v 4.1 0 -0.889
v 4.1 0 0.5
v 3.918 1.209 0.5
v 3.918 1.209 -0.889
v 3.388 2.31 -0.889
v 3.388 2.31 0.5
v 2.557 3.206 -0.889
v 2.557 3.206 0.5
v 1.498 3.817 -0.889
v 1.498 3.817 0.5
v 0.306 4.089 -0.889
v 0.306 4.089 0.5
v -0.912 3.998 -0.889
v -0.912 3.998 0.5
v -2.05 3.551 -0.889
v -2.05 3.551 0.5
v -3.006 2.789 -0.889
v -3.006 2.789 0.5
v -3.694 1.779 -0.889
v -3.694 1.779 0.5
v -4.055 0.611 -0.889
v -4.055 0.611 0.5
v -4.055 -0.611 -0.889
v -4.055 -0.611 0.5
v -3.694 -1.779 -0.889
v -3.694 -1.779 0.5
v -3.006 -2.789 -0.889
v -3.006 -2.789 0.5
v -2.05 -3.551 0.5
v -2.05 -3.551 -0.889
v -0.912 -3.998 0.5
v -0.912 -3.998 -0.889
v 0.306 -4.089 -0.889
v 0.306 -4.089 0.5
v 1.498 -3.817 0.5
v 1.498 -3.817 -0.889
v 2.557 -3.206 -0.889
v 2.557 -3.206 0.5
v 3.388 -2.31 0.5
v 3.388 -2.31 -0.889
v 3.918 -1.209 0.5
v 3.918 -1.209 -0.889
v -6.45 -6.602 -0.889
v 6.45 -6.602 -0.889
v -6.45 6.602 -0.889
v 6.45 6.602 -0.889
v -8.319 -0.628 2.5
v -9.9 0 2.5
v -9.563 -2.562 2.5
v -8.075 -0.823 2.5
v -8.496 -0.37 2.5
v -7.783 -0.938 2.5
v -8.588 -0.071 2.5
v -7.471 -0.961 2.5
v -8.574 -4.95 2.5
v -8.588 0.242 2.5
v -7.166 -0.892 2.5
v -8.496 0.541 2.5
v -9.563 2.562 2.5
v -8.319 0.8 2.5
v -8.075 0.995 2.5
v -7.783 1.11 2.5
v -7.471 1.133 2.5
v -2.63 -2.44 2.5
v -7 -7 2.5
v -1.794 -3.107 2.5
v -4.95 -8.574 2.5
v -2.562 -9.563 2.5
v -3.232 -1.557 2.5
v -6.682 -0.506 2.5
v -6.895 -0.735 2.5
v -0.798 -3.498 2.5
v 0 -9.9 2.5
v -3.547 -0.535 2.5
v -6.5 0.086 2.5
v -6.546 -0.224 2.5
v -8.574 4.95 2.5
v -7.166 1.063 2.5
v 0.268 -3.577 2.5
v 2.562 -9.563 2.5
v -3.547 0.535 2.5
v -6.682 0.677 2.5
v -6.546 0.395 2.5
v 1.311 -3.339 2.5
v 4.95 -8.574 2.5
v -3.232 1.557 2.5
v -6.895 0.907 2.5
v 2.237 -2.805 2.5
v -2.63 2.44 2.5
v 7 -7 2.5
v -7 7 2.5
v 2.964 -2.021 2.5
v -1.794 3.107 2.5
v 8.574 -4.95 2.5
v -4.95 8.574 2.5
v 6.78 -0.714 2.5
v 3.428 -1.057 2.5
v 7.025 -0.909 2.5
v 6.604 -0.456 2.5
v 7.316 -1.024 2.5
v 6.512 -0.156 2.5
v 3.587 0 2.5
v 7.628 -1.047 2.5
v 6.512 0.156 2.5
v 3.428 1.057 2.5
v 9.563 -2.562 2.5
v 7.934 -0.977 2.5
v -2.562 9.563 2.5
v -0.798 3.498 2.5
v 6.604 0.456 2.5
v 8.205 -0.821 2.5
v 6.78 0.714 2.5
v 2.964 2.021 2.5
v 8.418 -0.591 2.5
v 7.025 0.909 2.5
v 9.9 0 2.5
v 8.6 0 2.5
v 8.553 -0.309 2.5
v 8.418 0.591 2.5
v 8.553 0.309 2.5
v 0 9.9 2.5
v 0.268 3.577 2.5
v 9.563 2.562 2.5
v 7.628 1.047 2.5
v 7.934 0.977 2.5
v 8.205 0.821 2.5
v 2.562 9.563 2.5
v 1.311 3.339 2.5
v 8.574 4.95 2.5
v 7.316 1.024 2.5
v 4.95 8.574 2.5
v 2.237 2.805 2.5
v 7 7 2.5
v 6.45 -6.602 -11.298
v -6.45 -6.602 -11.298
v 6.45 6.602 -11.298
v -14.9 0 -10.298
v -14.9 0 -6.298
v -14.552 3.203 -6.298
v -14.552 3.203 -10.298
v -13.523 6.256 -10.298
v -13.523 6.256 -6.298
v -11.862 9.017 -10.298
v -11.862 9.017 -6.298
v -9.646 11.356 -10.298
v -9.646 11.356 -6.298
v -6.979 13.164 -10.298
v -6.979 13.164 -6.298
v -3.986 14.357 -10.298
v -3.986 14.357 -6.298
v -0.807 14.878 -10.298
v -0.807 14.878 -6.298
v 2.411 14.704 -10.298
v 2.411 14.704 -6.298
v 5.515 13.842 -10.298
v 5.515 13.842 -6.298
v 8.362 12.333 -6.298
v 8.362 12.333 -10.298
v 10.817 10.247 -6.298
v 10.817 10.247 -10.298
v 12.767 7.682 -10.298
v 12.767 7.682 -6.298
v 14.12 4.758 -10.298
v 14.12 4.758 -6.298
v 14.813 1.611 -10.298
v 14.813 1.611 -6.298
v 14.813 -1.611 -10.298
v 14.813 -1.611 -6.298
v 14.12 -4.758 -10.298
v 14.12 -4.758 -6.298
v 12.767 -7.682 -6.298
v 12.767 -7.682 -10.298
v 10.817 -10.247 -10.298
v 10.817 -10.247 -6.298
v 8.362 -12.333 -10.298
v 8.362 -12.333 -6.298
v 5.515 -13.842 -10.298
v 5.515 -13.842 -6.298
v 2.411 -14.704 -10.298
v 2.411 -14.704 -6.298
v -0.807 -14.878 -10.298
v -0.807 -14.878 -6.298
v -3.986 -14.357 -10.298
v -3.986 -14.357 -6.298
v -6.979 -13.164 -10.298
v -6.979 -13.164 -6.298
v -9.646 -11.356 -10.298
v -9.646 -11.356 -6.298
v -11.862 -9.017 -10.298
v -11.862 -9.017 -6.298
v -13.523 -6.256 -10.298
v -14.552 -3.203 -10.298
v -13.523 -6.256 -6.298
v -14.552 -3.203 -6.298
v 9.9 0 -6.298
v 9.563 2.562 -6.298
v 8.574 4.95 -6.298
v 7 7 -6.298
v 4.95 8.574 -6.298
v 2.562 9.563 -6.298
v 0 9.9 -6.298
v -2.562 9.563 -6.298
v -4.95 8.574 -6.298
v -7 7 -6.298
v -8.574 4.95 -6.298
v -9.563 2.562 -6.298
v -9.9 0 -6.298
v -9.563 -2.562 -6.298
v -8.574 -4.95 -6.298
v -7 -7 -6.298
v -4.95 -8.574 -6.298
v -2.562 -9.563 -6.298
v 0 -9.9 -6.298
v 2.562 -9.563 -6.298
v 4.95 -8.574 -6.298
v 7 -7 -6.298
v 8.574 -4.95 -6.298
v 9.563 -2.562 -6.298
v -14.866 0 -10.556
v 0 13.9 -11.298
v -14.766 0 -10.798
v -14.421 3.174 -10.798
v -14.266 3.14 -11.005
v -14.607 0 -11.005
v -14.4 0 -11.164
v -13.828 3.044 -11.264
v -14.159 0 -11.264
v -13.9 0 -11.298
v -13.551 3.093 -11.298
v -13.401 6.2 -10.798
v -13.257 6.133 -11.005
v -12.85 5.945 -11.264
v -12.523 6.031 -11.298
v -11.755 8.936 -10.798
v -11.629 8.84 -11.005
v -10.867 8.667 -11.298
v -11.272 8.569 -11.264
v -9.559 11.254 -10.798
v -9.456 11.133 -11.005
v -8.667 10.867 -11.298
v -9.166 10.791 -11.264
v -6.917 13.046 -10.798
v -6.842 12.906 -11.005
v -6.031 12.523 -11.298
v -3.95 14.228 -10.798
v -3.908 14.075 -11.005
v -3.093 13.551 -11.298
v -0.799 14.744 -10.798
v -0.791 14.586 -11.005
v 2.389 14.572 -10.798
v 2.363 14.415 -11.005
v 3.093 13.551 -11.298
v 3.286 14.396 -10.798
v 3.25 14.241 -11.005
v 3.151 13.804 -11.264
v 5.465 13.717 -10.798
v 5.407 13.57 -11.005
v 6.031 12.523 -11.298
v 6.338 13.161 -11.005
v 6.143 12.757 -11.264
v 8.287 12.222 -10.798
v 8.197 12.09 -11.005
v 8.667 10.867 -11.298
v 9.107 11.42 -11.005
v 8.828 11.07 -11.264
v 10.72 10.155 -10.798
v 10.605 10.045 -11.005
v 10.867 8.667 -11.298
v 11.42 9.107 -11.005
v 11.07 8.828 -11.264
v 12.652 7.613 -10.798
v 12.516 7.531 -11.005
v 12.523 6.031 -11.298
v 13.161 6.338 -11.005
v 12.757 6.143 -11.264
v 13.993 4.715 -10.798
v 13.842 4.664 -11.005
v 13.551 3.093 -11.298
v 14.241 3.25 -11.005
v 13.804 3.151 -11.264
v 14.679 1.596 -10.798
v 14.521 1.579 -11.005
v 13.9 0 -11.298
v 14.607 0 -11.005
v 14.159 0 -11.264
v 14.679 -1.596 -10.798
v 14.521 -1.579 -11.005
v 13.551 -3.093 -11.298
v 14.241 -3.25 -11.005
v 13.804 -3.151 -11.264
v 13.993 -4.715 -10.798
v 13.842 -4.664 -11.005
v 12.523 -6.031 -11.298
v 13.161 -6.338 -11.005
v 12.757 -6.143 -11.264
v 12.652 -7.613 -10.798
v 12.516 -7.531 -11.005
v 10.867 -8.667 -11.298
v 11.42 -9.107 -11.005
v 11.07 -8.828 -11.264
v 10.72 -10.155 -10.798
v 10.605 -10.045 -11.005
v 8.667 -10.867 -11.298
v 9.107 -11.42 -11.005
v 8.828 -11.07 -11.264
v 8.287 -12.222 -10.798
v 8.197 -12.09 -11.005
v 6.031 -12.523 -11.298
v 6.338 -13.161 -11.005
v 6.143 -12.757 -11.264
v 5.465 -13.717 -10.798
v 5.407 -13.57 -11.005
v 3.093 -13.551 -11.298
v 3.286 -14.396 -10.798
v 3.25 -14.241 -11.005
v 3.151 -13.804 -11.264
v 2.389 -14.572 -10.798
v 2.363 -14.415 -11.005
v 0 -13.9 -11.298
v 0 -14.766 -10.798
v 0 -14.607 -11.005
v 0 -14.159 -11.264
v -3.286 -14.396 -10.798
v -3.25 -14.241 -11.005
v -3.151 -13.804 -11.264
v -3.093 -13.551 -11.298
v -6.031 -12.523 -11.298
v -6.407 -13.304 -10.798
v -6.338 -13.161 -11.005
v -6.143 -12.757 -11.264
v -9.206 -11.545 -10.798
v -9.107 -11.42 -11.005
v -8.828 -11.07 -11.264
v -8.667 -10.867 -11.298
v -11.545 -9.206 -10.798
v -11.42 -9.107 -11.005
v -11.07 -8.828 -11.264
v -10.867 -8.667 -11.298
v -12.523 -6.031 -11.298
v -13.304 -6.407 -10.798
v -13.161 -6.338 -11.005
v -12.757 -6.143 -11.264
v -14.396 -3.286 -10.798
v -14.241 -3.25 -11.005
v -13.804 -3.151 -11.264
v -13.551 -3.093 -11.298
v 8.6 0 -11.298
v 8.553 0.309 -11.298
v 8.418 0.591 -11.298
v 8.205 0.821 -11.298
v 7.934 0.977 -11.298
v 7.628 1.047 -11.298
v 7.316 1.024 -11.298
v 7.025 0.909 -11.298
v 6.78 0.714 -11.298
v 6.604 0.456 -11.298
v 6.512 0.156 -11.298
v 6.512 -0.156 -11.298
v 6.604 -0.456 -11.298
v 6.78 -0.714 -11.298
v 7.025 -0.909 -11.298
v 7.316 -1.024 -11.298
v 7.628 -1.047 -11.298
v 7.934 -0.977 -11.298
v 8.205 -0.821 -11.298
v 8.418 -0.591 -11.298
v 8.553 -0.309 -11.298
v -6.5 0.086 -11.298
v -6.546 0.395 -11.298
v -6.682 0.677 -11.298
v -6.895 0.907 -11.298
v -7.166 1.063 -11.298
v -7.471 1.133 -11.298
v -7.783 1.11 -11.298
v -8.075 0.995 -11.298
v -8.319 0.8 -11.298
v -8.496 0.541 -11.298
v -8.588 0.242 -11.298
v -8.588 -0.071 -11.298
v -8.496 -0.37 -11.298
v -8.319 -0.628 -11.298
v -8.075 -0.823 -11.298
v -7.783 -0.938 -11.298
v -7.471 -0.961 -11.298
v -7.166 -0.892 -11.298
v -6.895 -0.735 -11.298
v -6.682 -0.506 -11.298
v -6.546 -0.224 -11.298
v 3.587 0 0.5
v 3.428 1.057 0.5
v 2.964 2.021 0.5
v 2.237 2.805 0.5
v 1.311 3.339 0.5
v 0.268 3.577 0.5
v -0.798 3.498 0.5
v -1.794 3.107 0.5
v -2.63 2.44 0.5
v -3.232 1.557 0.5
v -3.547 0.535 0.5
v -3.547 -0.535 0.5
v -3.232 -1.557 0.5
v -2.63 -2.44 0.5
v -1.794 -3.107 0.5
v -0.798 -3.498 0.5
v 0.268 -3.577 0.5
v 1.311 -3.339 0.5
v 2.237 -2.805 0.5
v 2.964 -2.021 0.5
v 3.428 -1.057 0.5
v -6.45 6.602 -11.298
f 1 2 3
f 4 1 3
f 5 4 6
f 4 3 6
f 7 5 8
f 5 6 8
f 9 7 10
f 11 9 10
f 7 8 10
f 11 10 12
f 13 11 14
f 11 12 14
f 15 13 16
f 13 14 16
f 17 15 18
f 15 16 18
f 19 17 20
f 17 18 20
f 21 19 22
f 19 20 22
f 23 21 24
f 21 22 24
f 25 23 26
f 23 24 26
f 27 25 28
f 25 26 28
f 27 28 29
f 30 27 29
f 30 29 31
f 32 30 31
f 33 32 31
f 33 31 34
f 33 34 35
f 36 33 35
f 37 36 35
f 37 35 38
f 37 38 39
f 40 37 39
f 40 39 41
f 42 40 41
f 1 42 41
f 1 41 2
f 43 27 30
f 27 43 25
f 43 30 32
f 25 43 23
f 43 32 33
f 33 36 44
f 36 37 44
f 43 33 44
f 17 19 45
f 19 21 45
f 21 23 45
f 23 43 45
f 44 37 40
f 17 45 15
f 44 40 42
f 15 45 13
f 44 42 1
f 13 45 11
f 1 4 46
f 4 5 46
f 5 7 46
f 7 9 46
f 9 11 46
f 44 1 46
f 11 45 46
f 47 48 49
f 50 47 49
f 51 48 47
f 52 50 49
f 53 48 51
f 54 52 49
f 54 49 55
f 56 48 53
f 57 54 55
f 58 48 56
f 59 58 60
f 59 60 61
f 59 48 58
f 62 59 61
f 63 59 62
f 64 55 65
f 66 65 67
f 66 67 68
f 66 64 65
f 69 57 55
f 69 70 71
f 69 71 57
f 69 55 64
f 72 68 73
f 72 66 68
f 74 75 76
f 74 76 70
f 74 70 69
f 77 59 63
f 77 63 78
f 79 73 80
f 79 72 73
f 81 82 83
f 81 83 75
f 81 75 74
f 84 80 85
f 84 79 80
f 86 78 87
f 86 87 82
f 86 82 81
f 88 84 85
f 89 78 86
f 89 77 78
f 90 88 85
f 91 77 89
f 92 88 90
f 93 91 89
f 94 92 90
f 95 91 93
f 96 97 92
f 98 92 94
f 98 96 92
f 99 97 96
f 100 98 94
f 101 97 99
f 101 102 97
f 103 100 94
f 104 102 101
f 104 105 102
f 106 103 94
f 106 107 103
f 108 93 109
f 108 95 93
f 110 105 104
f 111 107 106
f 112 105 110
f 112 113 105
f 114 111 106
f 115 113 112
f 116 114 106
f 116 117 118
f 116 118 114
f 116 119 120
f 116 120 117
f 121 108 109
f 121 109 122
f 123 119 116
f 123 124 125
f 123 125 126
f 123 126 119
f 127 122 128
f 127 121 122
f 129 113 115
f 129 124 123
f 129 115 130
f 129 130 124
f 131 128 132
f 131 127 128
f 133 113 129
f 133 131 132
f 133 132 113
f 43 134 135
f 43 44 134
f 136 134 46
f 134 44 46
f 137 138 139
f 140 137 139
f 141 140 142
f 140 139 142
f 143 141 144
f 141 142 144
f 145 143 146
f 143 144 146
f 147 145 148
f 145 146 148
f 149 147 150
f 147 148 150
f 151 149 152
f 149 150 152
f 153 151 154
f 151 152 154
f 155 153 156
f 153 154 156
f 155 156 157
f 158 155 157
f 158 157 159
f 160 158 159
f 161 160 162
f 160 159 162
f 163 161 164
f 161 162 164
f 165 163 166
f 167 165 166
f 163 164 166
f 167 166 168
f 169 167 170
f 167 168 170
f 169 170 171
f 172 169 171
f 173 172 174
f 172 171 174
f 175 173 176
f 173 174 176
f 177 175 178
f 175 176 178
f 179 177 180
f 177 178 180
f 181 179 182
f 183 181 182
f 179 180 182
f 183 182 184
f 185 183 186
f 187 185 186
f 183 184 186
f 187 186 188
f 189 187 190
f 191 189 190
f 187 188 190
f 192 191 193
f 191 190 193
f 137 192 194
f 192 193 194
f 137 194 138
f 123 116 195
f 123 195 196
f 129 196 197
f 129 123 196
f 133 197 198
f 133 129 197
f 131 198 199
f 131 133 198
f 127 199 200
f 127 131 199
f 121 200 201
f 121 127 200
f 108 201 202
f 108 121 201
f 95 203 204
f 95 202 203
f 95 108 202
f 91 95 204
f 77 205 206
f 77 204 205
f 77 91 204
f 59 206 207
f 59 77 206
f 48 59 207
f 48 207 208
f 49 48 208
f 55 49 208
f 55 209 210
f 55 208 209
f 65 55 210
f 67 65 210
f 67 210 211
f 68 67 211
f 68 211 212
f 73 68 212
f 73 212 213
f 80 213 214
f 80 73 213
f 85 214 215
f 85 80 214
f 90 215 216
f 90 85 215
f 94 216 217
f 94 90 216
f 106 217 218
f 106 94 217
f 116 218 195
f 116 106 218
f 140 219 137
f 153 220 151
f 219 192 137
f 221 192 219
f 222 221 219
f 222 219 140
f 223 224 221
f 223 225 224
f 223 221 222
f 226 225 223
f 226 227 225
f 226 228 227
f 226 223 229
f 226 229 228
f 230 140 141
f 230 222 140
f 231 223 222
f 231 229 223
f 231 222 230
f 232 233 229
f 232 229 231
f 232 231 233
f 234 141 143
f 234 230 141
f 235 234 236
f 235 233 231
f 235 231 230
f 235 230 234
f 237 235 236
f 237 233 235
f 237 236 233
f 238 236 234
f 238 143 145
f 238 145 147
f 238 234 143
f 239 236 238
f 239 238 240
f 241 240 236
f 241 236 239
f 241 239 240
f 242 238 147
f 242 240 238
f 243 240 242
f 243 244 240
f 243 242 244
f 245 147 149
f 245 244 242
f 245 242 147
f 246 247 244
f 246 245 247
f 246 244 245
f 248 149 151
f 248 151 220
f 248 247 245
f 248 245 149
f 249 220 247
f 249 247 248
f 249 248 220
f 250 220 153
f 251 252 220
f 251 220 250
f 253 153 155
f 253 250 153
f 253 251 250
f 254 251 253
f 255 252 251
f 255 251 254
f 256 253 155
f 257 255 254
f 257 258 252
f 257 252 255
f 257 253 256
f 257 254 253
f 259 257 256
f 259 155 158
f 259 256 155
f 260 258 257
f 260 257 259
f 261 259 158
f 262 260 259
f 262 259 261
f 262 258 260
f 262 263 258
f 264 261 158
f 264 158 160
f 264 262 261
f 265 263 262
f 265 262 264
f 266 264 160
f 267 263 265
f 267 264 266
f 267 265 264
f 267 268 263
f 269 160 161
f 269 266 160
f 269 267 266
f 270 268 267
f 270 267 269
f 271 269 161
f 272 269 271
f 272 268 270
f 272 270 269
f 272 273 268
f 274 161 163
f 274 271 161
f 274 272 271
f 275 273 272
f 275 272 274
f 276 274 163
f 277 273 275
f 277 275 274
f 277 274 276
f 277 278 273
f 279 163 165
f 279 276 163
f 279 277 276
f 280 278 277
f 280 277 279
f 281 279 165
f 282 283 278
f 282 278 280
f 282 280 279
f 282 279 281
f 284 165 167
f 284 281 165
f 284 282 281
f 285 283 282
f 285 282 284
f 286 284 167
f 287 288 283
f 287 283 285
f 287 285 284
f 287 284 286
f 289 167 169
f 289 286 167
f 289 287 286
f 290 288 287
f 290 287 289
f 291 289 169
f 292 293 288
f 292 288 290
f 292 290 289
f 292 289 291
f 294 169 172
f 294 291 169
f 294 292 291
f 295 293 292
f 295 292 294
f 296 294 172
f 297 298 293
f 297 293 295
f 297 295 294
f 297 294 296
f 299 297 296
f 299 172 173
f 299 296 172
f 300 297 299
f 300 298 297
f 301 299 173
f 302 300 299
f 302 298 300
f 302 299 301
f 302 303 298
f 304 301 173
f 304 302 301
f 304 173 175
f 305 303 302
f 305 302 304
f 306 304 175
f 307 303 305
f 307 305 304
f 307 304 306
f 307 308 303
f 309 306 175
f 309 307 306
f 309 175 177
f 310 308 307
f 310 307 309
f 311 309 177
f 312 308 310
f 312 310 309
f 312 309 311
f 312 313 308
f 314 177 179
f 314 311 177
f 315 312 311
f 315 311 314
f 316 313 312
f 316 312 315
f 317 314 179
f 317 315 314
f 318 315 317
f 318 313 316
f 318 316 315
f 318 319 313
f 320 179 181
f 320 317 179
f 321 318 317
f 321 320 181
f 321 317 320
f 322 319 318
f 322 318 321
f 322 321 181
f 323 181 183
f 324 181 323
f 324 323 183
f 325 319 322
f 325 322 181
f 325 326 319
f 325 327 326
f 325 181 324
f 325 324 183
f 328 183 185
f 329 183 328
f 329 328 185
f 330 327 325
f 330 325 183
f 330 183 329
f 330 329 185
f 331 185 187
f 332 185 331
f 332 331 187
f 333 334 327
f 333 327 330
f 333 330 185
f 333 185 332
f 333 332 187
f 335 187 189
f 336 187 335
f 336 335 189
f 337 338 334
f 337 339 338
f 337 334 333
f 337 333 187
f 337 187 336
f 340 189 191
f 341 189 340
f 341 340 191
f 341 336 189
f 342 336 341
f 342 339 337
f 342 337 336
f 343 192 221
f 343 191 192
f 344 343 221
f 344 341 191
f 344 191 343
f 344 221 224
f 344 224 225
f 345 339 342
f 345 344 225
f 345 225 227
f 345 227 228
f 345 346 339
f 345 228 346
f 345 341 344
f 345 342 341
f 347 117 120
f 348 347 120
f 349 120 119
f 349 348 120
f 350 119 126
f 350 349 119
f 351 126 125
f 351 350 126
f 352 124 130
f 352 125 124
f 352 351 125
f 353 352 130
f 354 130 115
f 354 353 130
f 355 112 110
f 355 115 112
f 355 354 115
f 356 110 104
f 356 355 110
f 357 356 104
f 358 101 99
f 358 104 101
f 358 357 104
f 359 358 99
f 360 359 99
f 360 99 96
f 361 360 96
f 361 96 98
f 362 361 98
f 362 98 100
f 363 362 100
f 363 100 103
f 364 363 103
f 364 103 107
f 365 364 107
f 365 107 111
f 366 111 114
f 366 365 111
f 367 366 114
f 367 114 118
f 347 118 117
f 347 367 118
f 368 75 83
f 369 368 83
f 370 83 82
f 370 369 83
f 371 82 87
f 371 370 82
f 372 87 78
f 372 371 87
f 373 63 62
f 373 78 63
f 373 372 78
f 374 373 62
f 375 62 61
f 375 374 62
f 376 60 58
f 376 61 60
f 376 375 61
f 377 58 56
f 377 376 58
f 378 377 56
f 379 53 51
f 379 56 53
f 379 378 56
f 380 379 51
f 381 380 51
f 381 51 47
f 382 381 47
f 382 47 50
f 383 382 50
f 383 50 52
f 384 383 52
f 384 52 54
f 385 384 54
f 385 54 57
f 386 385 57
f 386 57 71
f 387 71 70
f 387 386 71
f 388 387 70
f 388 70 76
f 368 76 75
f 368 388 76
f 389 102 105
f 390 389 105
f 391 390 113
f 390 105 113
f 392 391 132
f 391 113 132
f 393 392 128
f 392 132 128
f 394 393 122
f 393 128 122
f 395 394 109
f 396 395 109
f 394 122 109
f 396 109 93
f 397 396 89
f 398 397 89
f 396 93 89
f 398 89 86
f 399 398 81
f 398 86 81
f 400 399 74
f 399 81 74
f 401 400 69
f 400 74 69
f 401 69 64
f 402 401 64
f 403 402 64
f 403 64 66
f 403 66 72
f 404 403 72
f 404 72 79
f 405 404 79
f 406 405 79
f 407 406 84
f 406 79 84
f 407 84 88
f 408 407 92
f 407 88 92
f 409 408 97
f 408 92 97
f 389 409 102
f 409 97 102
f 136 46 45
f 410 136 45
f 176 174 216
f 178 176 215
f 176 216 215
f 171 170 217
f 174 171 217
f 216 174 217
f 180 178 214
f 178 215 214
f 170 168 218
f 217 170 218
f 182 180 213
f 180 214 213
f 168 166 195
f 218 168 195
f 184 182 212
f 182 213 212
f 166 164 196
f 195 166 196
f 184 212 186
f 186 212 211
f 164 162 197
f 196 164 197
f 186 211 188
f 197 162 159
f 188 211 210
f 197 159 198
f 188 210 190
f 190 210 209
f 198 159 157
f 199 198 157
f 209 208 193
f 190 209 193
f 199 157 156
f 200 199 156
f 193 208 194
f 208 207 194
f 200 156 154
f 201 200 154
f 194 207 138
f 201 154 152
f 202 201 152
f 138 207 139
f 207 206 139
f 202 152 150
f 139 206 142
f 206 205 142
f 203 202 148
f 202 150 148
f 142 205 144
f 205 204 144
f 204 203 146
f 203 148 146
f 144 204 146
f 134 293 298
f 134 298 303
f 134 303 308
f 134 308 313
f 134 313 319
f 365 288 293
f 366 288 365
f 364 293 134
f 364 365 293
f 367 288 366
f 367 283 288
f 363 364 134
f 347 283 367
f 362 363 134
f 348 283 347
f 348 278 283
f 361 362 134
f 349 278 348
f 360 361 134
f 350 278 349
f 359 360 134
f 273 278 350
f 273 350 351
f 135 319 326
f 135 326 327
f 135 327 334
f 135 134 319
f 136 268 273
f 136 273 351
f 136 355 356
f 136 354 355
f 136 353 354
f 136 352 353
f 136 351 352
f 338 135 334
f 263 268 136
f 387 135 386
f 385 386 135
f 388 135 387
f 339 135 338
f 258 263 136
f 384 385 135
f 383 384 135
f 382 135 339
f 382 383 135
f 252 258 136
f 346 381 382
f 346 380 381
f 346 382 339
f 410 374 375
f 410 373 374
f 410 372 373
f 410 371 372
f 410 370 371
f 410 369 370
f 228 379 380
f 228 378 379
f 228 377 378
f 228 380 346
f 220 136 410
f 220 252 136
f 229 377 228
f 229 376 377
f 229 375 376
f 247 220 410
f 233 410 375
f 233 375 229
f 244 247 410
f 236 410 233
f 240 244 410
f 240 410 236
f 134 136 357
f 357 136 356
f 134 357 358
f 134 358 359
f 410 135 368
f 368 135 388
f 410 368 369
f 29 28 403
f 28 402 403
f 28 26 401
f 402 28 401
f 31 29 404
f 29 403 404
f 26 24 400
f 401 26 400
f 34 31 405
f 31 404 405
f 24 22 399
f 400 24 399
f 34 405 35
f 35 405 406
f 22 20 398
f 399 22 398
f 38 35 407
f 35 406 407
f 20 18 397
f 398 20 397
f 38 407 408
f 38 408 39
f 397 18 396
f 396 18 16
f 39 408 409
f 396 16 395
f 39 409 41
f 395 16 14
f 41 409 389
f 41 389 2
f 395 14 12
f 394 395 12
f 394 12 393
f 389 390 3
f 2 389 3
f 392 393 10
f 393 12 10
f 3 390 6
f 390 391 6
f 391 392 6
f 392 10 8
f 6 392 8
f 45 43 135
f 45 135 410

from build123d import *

# Parameters (mm, degrees)
SKETCH1_R               = 9.9
SKETCH1_R_2             = 4.1005
BOSS_EXTRUDE1_DEPTH     = 0.889
SKETCH2_R               = 9.9
SKETCH2_W               = 12.9
SKETCH2_H               = 13.2048
BOSS_EXTRUDE2_DEPTH     = 5.4086
SKETCH3_R               = 14.9
SKETCH3_W               = 12.9
SKETCH3_H               = 13.2048
BOSS_EXTRUDE3_DEPTH     = 5
CUT_EXTRUDE6_DEPTH      = 24.909323825
CUT_EXTRUDE6_DEPTH_BACK = 24.909323825
SKETCH4_R               = 1.05
BOSS_EXTRUDE4_START     = 0.5
SKETCH5_R               = 9.9
SKETCH5_R_2             = 4.1005
BOSS_EXTRUDE4_DEPTH     = 0.5
BOSS_EXTRUDE5_START     = 2
SKETCH6_R               = 9.9
SKETCH6_R_2             = 3.587456629
BOSS_EXTRUDE5_DEPTH     = 2
FILLET1_R               = 1
CUT_EXTRUDE7_DEPTH      = 26.187174628
CUT_EXTRUDE7_DEPTH_BACK = 26.187174628
SKETCH7_R               = 1.05


with BuildPart() as part:
    # Sketch1 → Boss-Extrude1 (new body)
    with BuildSketch(Plane.XY):
        Circle(SKETCH1_R)
        Circle(SKETCH1_R_2, mode=Mode.SUBTRACT)
    extrude(amount=-BOSS_EXTRUDE1_DEPTH)

    # Sketch2 → Boss-Extrude2 (add)
    with BuildSketch(Plane(origin=(0, 0, -0.889), x_dir=(-1, 0, 0), z_dir=(0, 0, -1))):
        with Locations(Location((0, 0, 0), (0, 0, 180))):
            Circle(SKETCH2_R)
        Rectangle(SKETCH2_W, SKETCH2_H, mode=Mode.SUBTRACT)
    extrude(amount=BOSS_EXTRUDE2_DEPTH)

    # Sketch3 → Boss-Extrude3 (add)
    with BuildSketch(Plane(origin=(0, 0, -6.2976), x_dir=(-1, 0, 0), z_dir=(0, 0, -1))):
        Circle(SKETCH3_R)
        Rectangle(SKETCH3_W, SKETCH3_H, mode=Mode.SUBTRACT)
    extrude(amount=BOSS_EXTRUDE3_DEPTH)

    # Sketch4 → Cut-Extrude6 (cut, two sides: drawn at the far end of the back side and taken through both)
    with BuildSketch(Plane.XY.offset(-CUT_EXTRUDE6_DEPTH_BACK)):
        with Locations((-7.549511775, 0.085860102)):
            Circle(SKETCH4_R)
        with Locations((7.55, 0)):
            Circle(SKETCH4_R)
    extrude(amount=CUT_EXTRUDE6_DEPTH + CUT_EXTRUDE6_DEPTH_BACK, mode=Mode.SUBTRACT)

    # Sketch5 → Boss-Extrude4 (add)
    with BuildSketch(Plane.XY.offset(BOSS_EXTRUDE4_START)):
        Circle(SKETCH5_R)
        Circle(SKETCH5_R_2, mode=Mode.SUBTRACT)
    extrude(amount=-BOSS_EXTRUDE4_DEPTH)

    # Sketch6 → Boss-Extrude5 (add)
    with BuildSketch(Plane.XY.offset(0.5).offset(BOSS_EXTRUDE5_START)):
        Circle(SKETCH6_R)
        Circle(SKETCH6_R_2, mode=Mode.SUBTRACT)
    extrude(amount=-BOSS_EXTRUDE5_DEPTH)

    # Fillet1
    fillet1_edges = [part.edges().sort_by_distance(p)[0] for p in [
        (14.9, 0, -11.2976),
    ]]
    fillet(fillet1_edges, radius=FILLET1_R)

    # Sketch7 → Cut-Extrude7 (cut, two sides: drawn at the far end of the back side and taken through both)
    with BuildSketch(Plane.XY.offset(2.5).offset(-CUT_EXTRUDE7_DEPTH_BACK)):
        with Locations((7.55, 0)):
            Circle(SKETCH7_R)
        with Locations((-7.549511775, 0.085860102)):
            Circle(SKETCH7_R)
    extrude(amount=CUT_EXTRUDE7_DEPTH + CUT_EXTRUDE7_DEPTH_BACK, mode=Mode.SUBTRACT)


solid = part.part
